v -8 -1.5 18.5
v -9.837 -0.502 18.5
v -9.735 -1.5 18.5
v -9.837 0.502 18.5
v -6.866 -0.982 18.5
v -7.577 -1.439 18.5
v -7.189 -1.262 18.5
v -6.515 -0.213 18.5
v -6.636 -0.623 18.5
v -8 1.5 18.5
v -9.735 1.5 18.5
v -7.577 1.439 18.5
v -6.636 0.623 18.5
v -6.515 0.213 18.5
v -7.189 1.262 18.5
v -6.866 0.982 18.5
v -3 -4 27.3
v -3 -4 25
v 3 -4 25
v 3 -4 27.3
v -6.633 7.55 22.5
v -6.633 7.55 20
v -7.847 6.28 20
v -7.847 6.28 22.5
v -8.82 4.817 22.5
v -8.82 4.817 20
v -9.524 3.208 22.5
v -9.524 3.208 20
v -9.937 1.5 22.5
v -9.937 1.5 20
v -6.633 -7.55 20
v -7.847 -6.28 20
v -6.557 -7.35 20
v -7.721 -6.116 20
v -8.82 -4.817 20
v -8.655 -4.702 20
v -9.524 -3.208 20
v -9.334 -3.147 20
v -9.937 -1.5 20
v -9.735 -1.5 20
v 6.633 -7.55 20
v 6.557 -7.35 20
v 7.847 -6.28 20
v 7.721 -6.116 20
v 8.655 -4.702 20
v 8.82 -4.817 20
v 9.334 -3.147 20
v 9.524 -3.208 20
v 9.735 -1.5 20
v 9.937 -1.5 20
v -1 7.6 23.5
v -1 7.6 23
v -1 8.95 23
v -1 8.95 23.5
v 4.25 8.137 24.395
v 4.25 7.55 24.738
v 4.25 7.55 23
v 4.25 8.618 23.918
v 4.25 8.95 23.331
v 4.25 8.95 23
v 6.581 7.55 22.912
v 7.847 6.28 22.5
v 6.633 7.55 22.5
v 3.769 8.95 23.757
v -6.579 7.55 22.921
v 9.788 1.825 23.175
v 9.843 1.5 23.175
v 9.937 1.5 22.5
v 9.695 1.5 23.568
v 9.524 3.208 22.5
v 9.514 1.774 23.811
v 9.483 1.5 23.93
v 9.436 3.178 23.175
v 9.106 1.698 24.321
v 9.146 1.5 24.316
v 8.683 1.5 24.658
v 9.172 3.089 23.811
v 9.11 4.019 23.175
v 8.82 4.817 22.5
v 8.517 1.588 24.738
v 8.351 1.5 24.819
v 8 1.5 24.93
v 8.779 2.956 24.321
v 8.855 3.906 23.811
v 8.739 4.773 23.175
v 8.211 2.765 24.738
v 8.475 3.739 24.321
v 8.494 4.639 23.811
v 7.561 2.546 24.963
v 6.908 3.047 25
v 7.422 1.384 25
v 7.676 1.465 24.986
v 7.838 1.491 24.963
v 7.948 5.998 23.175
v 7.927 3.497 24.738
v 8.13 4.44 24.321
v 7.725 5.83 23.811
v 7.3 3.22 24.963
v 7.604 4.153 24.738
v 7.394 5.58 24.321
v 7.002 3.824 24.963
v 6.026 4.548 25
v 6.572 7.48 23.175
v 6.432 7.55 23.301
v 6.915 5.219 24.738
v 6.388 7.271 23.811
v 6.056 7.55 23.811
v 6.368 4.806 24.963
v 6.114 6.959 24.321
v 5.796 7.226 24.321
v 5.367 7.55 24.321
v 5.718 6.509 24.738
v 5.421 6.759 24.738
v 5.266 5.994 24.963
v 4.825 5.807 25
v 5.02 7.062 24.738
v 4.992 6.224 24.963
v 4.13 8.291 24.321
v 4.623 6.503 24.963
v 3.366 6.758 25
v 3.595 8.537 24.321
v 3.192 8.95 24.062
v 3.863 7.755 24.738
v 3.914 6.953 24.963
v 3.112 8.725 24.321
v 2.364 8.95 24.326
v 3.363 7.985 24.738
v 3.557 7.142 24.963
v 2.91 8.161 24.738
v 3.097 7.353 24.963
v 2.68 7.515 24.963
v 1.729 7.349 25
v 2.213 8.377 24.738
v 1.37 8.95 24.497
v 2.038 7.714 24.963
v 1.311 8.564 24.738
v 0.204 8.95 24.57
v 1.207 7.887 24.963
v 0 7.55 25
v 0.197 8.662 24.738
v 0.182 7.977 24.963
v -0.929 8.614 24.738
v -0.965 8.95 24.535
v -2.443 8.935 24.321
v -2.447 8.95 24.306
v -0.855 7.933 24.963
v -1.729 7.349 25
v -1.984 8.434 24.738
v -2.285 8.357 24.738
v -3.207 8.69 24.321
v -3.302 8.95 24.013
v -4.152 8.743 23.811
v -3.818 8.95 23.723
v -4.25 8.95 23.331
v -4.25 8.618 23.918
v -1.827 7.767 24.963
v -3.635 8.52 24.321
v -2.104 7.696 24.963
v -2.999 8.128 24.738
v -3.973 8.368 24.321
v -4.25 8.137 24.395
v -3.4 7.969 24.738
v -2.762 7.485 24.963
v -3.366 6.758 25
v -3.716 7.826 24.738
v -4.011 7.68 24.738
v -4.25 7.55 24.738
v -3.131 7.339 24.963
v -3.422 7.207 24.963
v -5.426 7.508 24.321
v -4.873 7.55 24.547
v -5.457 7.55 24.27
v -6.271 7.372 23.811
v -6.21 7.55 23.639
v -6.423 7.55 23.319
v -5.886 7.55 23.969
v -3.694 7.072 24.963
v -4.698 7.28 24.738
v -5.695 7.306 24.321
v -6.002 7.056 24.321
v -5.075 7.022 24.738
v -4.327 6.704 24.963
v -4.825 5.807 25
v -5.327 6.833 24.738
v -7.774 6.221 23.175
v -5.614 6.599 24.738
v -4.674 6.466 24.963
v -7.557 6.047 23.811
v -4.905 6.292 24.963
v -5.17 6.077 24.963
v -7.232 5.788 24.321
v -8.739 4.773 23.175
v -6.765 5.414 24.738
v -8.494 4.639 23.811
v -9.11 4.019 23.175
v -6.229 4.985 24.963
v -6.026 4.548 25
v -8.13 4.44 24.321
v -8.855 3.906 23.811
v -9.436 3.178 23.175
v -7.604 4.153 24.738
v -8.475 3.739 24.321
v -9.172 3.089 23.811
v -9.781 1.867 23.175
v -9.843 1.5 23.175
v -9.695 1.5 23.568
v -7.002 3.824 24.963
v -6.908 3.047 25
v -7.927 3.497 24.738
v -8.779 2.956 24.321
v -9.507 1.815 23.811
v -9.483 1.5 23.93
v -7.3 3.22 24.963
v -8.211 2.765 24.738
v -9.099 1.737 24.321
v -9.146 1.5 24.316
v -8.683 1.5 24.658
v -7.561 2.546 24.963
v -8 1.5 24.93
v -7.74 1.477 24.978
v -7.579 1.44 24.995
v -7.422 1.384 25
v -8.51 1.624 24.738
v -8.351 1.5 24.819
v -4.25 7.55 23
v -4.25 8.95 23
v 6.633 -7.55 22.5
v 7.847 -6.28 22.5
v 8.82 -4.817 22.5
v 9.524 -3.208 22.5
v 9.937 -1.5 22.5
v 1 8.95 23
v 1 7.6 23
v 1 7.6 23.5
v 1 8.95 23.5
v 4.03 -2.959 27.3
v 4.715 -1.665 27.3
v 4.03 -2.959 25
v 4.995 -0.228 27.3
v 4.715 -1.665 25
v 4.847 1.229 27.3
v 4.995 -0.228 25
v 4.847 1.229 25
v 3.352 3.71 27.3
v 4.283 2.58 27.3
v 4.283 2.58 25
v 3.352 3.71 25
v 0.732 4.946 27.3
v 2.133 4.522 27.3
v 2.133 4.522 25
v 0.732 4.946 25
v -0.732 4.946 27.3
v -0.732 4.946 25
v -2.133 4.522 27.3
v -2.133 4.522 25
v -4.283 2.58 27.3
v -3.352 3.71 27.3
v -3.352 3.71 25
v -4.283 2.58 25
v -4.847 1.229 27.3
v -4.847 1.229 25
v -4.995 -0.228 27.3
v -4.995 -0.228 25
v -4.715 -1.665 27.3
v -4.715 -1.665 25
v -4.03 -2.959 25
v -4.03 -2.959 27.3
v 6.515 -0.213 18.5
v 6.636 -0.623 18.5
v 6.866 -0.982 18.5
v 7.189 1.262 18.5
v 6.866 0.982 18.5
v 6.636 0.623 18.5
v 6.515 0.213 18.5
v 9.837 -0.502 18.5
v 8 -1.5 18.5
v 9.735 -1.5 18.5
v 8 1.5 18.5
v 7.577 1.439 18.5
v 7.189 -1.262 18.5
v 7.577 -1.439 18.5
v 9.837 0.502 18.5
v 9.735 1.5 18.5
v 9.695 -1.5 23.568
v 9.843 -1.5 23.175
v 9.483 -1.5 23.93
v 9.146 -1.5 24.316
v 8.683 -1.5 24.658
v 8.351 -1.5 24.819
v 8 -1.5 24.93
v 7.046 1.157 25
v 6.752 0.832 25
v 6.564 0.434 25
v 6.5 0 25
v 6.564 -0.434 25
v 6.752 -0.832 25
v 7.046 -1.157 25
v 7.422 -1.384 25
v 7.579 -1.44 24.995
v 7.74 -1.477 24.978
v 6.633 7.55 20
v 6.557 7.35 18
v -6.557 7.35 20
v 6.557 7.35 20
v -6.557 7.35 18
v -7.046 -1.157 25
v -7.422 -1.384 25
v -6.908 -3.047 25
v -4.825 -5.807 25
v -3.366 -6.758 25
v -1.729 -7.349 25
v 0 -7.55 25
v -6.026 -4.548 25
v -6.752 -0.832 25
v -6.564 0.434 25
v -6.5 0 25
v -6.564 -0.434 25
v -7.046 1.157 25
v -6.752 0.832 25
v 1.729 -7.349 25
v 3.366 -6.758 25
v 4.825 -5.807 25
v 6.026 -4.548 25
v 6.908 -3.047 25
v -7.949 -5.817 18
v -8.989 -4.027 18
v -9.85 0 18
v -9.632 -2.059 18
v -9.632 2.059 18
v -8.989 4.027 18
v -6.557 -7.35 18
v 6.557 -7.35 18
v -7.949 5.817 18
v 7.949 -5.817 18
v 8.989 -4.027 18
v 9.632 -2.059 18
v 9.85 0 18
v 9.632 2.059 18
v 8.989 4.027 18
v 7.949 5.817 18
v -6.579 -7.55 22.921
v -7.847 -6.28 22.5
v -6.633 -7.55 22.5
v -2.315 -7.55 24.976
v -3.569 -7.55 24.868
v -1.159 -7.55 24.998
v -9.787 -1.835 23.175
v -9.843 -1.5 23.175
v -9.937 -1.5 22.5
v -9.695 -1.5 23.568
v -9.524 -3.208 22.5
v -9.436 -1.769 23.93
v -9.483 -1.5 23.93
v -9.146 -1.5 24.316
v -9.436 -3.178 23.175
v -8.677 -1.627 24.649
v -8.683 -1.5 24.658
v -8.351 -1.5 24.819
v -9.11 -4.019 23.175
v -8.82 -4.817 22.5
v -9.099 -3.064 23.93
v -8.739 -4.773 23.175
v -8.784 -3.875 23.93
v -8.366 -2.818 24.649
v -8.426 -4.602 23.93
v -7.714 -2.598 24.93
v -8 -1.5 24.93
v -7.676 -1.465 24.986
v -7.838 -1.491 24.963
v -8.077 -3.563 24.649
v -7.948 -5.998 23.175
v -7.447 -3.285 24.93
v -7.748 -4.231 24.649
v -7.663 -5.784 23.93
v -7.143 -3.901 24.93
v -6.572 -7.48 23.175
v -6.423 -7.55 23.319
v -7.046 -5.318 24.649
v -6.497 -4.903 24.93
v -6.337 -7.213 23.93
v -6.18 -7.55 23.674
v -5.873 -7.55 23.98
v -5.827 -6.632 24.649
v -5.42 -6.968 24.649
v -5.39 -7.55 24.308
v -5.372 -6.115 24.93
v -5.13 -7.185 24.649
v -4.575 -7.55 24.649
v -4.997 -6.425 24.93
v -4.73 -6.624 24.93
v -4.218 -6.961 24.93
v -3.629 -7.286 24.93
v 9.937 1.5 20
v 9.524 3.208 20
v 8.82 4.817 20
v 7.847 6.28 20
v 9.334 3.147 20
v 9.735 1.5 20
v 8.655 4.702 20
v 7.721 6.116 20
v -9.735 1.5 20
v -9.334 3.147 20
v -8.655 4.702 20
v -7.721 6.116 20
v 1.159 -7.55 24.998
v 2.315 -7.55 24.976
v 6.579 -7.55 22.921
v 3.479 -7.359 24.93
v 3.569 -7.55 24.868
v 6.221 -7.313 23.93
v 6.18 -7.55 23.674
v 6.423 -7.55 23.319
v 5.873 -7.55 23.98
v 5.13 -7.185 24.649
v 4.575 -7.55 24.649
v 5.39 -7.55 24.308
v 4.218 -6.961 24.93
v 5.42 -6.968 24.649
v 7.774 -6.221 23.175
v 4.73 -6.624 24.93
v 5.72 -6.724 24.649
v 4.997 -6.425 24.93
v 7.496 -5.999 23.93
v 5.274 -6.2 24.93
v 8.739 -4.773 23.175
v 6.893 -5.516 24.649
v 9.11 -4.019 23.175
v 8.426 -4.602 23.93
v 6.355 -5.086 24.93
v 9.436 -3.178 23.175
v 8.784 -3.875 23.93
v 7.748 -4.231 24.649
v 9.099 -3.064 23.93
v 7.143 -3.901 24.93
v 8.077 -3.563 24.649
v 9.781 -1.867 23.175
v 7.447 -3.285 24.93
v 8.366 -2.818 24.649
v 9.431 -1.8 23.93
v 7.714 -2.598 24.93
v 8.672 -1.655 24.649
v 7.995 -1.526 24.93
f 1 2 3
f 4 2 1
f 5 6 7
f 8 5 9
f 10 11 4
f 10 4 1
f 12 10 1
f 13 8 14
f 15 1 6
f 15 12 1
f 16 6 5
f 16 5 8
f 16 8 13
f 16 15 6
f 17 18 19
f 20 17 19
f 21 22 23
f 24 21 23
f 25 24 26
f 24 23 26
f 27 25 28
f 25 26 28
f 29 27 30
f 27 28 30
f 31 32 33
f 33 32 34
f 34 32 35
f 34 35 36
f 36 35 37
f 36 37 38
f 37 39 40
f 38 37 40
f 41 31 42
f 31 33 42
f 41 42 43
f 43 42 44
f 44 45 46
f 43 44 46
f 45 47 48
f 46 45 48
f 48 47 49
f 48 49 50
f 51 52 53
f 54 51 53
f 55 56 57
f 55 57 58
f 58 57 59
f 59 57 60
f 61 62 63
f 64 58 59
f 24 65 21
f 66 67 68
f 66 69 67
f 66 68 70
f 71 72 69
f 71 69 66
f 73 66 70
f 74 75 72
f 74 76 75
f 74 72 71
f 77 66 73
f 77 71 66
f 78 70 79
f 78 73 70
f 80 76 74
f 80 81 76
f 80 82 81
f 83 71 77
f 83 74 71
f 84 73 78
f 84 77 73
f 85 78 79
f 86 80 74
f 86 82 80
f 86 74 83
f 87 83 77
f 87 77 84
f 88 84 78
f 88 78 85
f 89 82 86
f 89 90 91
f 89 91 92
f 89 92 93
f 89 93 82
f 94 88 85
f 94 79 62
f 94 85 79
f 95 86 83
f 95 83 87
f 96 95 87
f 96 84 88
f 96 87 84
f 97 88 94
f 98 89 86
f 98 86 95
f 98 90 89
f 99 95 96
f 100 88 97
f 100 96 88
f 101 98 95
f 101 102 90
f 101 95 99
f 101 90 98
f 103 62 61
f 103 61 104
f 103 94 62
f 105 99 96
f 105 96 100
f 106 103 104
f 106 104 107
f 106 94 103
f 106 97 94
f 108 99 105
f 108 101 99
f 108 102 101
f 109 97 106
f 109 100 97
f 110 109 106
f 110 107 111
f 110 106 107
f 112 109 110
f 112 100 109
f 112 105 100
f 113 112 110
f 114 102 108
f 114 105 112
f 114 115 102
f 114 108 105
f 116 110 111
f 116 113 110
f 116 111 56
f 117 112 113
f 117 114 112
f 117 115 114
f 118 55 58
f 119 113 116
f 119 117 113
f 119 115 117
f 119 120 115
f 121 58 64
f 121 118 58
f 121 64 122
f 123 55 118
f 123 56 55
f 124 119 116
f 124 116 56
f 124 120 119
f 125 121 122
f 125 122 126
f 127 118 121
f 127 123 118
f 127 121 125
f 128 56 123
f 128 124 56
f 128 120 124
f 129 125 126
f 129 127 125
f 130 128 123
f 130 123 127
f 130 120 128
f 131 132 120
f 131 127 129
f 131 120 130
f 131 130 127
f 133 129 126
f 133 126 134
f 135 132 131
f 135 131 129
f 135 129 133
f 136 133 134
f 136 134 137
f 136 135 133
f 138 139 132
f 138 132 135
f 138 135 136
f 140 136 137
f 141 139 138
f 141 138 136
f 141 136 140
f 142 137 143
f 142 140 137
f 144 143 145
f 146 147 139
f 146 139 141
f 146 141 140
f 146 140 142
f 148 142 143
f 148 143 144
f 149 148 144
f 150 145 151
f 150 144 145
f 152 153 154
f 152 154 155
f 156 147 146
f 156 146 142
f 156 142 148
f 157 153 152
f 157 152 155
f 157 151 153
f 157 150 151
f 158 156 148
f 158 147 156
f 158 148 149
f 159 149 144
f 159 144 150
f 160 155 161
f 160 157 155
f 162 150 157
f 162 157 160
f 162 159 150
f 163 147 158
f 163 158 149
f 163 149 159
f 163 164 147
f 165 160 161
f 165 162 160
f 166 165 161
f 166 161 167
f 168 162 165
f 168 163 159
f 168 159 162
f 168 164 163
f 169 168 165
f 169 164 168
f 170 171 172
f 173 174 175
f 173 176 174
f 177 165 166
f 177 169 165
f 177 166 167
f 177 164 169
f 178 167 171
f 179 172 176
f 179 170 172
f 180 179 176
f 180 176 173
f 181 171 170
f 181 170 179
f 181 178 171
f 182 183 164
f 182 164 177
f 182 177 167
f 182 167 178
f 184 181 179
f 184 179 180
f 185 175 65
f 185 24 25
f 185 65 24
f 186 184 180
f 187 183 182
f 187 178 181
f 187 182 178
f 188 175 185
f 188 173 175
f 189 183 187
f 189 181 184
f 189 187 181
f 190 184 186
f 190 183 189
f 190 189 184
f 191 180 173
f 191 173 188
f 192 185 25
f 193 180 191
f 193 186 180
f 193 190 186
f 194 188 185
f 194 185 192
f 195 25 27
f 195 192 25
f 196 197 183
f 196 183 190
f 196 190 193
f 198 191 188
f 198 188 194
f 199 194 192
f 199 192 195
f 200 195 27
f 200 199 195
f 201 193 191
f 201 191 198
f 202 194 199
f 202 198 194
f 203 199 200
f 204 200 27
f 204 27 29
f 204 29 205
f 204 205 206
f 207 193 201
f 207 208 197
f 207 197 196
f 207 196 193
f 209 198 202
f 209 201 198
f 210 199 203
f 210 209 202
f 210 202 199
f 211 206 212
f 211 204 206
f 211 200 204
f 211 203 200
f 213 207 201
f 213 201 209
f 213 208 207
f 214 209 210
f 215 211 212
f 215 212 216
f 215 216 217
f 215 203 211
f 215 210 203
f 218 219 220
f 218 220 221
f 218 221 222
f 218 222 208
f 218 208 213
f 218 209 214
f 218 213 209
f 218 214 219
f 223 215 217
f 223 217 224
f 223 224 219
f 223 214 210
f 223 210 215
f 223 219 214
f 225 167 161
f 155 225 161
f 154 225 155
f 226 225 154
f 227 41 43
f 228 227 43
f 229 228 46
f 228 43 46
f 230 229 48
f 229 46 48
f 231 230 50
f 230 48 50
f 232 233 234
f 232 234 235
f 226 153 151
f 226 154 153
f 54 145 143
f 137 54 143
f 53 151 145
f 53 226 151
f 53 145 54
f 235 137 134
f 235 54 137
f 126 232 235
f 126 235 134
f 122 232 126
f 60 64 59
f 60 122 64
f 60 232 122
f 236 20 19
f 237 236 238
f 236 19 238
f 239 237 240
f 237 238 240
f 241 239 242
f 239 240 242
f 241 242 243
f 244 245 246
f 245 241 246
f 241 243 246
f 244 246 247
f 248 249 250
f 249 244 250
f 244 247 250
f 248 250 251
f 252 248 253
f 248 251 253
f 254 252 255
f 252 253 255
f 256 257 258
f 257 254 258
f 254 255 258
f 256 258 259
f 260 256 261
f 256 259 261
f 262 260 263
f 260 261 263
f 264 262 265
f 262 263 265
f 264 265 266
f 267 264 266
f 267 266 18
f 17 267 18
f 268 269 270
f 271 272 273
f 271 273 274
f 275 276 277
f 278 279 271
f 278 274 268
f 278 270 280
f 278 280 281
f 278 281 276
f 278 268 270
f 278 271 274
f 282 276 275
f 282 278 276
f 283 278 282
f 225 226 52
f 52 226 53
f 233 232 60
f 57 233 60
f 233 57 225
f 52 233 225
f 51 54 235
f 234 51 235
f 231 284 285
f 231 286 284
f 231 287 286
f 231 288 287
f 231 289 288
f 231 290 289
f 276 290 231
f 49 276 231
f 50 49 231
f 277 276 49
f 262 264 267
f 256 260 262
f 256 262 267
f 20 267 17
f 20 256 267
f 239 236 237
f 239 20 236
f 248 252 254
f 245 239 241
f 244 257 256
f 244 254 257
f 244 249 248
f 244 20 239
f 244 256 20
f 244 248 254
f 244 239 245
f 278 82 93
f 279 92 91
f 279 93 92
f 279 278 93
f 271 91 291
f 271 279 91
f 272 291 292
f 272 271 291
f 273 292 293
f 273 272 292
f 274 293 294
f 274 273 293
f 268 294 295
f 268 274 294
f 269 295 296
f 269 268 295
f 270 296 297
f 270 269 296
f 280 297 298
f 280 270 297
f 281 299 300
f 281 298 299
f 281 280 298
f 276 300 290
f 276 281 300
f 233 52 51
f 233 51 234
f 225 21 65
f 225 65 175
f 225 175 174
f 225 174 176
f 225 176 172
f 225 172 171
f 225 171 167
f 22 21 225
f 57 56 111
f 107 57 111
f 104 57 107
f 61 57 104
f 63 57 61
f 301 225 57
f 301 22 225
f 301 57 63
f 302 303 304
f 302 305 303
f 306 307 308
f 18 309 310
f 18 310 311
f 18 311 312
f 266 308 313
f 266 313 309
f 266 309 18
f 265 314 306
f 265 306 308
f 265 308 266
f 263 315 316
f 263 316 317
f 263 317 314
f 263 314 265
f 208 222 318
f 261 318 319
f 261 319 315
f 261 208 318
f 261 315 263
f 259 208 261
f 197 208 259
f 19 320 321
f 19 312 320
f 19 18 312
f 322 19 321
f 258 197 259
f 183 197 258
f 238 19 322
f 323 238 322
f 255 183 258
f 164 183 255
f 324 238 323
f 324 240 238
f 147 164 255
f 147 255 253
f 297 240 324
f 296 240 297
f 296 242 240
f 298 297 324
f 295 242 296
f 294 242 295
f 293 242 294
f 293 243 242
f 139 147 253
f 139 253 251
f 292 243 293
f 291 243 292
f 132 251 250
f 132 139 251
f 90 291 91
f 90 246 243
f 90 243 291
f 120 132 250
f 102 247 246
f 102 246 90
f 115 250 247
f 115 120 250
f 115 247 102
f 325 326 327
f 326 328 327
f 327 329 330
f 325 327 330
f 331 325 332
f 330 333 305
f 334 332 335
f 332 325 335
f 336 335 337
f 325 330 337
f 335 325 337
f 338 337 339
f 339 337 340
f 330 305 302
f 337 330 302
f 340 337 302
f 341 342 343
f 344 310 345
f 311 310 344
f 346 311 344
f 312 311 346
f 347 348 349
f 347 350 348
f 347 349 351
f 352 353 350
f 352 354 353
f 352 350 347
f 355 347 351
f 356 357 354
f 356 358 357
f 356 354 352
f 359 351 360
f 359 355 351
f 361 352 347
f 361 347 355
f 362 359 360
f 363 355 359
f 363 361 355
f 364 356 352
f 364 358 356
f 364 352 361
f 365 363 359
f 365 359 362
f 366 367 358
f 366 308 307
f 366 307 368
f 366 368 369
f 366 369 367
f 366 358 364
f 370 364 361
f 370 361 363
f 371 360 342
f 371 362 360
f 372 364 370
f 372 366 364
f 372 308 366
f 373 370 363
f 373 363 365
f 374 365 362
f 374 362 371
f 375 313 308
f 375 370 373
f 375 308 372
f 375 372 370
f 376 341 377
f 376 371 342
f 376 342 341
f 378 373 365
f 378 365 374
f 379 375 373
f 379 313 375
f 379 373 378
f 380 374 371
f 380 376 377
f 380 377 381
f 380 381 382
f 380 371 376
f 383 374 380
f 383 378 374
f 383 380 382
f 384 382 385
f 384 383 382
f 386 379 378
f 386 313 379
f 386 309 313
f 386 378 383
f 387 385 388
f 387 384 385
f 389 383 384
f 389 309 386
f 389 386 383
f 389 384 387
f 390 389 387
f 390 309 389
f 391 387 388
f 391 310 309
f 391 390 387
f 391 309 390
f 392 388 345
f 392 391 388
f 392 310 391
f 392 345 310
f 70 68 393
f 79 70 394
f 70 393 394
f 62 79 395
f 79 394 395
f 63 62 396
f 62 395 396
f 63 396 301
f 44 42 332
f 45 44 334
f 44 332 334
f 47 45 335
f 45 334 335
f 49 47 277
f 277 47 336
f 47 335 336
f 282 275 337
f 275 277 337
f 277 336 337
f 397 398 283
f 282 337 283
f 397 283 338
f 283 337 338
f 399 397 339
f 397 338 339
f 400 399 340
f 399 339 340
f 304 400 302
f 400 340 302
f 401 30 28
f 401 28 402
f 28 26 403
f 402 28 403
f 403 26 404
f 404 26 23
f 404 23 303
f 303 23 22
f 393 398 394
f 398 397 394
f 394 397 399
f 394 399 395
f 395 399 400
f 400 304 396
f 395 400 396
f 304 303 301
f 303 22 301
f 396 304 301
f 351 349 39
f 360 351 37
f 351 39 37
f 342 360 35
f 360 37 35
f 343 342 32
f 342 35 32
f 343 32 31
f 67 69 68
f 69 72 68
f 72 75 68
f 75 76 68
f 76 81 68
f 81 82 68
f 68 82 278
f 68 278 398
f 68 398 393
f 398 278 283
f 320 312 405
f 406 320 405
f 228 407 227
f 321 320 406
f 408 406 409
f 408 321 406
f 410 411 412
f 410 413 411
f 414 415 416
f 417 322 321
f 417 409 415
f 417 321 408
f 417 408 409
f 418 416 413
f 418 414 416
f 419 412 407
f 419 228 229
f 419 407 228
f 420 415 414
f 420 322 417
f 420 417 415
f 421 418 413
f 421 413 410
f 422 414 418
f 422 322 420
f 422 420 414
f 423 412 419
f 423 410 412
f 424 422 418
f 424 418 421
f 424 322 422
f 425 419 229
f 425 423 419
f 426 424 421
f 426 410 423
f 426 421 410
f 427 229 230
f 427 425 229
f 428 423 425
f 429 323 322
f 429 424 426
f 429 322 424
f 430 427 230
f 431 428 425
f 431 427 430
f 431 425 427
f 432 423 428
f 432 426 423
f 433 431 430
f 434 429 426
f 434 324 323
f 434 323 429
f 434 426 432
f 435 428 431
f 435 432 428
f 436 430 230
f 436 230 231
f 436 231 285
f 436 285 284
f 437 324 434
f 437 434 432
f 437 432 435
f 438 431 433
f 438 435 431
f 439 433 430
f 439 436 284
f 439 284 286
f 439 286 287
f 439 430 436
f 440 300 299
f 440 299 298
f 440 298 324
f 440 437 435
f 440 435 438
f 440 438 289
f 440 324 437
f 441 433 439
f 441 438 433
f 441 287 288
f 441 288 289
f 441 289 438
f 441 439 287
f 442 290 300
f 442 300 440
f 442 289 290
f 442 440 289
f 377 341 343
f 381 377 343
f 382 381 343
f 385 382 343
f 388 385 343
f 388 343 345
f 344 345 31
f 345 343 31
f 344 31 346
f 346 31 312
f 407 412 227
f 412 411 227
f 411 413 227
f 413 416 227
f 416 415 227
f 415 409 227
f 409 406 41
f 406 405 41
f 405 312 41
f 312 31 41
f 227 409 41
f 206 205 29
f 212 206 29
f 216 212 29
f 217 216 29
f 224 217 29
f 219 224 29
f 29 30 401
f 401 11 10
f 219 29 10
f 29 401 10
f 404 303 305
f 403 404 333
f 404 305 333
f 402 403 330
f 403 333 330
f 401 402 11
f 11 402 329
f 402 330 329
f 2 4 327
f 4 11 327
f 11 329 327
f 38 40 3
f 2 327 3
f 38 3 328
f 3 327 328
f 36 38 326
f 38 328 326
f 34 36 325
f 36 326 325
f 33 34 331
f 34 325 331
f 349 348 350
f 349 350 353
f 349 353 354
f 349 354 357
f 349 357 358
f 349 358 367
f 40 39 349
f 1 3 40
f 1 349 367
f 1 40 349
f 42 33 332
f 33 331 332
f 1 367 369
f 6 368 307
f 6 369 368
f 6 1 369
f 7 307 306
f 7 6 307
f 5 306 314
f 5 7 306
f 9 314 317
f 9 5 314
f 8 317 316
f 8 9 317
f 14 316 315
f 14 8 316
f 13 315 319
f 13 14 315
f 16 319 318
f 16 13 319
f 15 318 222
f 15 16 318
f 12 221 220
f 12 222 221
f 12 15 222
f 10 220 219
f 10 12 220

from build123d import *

# Parameters (mm, degrees)
BOX010_W          = 30
BOX010_H          = 10
BOX010_DEPTH      = 30
BOX011_W          = 30
BOX011_H          = 10
BOX011_DEPTH      = 30
CYLINDER003_R     = 10.05
CYLINDER003_DEPTH = 20
FILLET002_R       = 2
THICKNESS_T       = -0.2
BOX017_W          = 20
BOX017_H          = 10
BOX017_DEPTH      = 10
CYLINDER005_R     = 5
CYLINDER005_DEPTH = 3.3
PAD002_DEPTH      = 20
BOX016_W          = 2
BOX016_H          = 2
BOX016_DEPTH      = 2
BOX015_W          = 30
BOX015_H          = 10
BOX015_DEPTH      = 30
BOX013_W          = 30
BOX013_H          = 10
BOX013_DEPTH      = 30
BOX014_W          = 8.5
BOX014_H          = 2.4
BOX014_DEPTH      = 44
BOX012_W          = 30
BOX012_H          = 10
BOX012_DEPTH      = 30
CYLINDER004_R     = 10.05
CYLINDER004_DEPTH = 7
FILLET003_R       = 2.5


with BuildPart() as cubo011:
    # Box010 → Box010 (new body)
    with BuildSketch(Plane(origin=(-15, 7.55, -3), x_dir=(1, 0, 0), z_dir=(0, 0, 1))):
        with Locations((15, 5)):
            Rectangle(BOX010_W, BOX010_H)
    extrude(amount=BOX010_DEPTH)


with BuildPart() as cubo012:
    # Box011 → Box011 (new body)
    with BuildSketch(Plane(origin=(-15, -17.55, -3), x_dir=(1, 0, 0), z_dir=(0, 0, 1))):
        with Locations((15, 5)):
            Rectangle(BOX011_W, BOX011_H)
    extrude(amount=BOX011_DEPTH)


with BuildPart() as thickness:
    # Cylinder003 → Cylinder003 (new body)
    with BuildSketch(Plane.XY):
        Circle(CYLINDER003_R)
    extrude(amount=CYLINDER003_DEPTH)

    # Fillet002
    fillet002_edges = [thickness.edges().sort_by_distance(p)[0] for p in [
        (-10.05, 0, 0),
    ]]
    fillet(fillet002_edges, radius=FILLET002_R)

    # Cut010: cut Cubo012
    add(cubo012.part, mode=Mode.SUBTRACT)

    # Cut011: cut Cubo011
    add(cubo011.part, mode=Mode.SUBTRACT)

    # Thickness
    thickness_openings = [thickness.faces().sort_by_distance(p)[0] for p in [
        (0, 0, 20),
    ]]
    offset(amount=THICKNESS_T, openings=thickness_openings)


with BuildPart() as cubo018:
    # Box017 → Box017 (new body)
    with BuildSketch(Plane(origin=(-10, -14, -3), x_dir=(1, 0, 0), z_dir=(0, 0, 1))):
        with Locations((10, 5)):
            Rectangle(BOX017_W, BOX017_H)
    extrude(amount=BOX017_DEPTH)


with BuildPart() as partefinal001:
    # Cylinder005 → Cylinder005 (new body)
    with BuildSketch(Plane.XY):
        Circle(CYLINDER005_R)
    extrude(amount=CYLINDER005_DEPTH)

    # Cut017: cut Cubo018
    add(cubo018.part, mode=Mode.SUBTRACT)


with BuildPart() as partefinal001_1:
    # Cut017 placement: moved
    add(partefinal001.part.moved(Location((0, 0, 6))))


with BuildPart() as pad002:
    # Sketch002 → Pad002 (new body)
    with BuildSketch(Plane.XY):
        with BuildLine():
            ThreePointArc((-10, 1.5), (-11.5, 0), (-10, -1.5))
            Line((-10, -1.5), (10, -1.5))
            ThreePointArc((10, -1.5), (11.5, 0), (10, 1.5))
            Line((-10, 1.5), (10, 1.5))
        make_face()
    extrude(amount=PAD002_DEPTH)


with BuildPart() as clone_of_pad004:
    # Clone004 base: copy of Pad002
    add(pad002.part)


with BuildPart() as clone_of_pad004_1:
    # Clone004 placement: moved
    add(clone_of_pad004.part.moved(Location((18, 0, 0.5))))


with BuildPart() as clone_of_pad003:
    # Clone003 base: copy of Pad002
    add(pad002.part)


with BuildPart() as clone_of_pad003_1:
    # Clone003 placement: moved
    add(clone_of_pad003.part.moved(Location((-18, 0, 0.5))))


with BuildPart() as cubo017:
    # Box016 → Box016 (new body)
    with BuildSketch(Plane(origin=(-1, 7.6, 3.5), x_dir=(1, 0, 0), z_dir=(0, 0, 1))):
        with Locations((1, 1)):
            Rectangle(BOX016_W, BOX016_H)
    extrude(amount=BOX016_DEPTH)


with BuildPart() as cubo016:
    # Box015 → Box015 (new body)
    with BuildSketch(Plane(origin=(-15, 7.55, -25), x_dir=(1, 0, 0), z_dir=(0, 0, 1))):
        with Locations((15, 5)):
            Rectangle(BOX015_W, BOX015_H)
    extrude(amount=BOX015_DEPTH)


with BuildPart() as cubo014:
    # Box013 → Box013 (new body)
    with BuildSketch(Plane(origin=(-15, -17.55, -3), x_dir=(1, 0, 0), z_dir=(0, 0, 1))):
        with Locations((15, 5)):
            Rectangle(BOX013_W, BOX013_H)
    extrude(amount=BOX013_DEPTH)


with BuildPart() as cubo015:
    # Box014 → Box014 (new body)
    with BuildSketch(Plane(origin=(-4.25, 6.55, -4), x_dir=(1, 0, 0), z_dir=(0, 0, 1))):
        with Locations((4.25, 1.2)):
            Rectangle(BOX014_W, BOX014_H)
    extrude(amount=BOX014_DEPTH)


with BuildPart() as cut012:
    # Box012 → Box012 (new body)
    with BuildSketch(Plane(origin=(-15, 7.55, -3), x_dir=(1, 0, 0), z_dir=(0, 0, 1))):
        with Locations((15, 5)):
            Rectangle(BOX012_W, BOX012_H)
    extrude(amount=BOX012_DEPTH)

    # Cut012: cut Cubo015
    add(cubo015.part, mode=Mode.SUBTRACT)


with BuildPart() as cut012_1:
    # Cut012 placement: moved
    add(cut012.part.moved(Location((0, 0, -12))))


with BuildPart() as tapa:
    # Cylinder004 → Cylinder004 (new body)
    with BuildSketch(Plane.XY):
        Circle(CYLINDER004_R)
    extrude(amount=CYLINDER004_DEPTH)

    # Fillet003
    fillet003_edges = [tapa.edges().sort_by_distance(p)[0] for p in [
        (-10.05, 0, 7),
    ]]
    fillet(fillet003_edges, radius=FILLET003_R)

    # Cut013: cut Cut012
    add(cut012_1.part, mode=Mode.SUBTRACT)

    # Cut014: cut Cubo014
    add(cubo014.part, mode=Mode.SUBTRACT)

    # Cut015: cut Cubo016
    add(cubo016.part, mode=Mode.SUBTRACT)

    # Cut016: cut Cubo017
    add(cubo017.part, mode=Mode.SUBTRACT)

    # Cut018: cut Clone of Pad003
    add(clone_of_pad003_1.part, mode=Mode.SUBTRACT)

    # Cut019: cut Clone of Pad004
    add(clone_of_pad004_1.part, mode=Mode.SUBTRACT)

    # Fusion002: union parteFinal001
    add(partefinal001_1.part)


with BuildPart() as tapa_1:
    # Fusion002 placement: moved
    add(tapa.part.moved(Location((0, 0, 18))))

    # Cut020: cut Thickness
    add(thickness.part, mode=Mode.SUBTRACT)


solid = tapa_1.part
